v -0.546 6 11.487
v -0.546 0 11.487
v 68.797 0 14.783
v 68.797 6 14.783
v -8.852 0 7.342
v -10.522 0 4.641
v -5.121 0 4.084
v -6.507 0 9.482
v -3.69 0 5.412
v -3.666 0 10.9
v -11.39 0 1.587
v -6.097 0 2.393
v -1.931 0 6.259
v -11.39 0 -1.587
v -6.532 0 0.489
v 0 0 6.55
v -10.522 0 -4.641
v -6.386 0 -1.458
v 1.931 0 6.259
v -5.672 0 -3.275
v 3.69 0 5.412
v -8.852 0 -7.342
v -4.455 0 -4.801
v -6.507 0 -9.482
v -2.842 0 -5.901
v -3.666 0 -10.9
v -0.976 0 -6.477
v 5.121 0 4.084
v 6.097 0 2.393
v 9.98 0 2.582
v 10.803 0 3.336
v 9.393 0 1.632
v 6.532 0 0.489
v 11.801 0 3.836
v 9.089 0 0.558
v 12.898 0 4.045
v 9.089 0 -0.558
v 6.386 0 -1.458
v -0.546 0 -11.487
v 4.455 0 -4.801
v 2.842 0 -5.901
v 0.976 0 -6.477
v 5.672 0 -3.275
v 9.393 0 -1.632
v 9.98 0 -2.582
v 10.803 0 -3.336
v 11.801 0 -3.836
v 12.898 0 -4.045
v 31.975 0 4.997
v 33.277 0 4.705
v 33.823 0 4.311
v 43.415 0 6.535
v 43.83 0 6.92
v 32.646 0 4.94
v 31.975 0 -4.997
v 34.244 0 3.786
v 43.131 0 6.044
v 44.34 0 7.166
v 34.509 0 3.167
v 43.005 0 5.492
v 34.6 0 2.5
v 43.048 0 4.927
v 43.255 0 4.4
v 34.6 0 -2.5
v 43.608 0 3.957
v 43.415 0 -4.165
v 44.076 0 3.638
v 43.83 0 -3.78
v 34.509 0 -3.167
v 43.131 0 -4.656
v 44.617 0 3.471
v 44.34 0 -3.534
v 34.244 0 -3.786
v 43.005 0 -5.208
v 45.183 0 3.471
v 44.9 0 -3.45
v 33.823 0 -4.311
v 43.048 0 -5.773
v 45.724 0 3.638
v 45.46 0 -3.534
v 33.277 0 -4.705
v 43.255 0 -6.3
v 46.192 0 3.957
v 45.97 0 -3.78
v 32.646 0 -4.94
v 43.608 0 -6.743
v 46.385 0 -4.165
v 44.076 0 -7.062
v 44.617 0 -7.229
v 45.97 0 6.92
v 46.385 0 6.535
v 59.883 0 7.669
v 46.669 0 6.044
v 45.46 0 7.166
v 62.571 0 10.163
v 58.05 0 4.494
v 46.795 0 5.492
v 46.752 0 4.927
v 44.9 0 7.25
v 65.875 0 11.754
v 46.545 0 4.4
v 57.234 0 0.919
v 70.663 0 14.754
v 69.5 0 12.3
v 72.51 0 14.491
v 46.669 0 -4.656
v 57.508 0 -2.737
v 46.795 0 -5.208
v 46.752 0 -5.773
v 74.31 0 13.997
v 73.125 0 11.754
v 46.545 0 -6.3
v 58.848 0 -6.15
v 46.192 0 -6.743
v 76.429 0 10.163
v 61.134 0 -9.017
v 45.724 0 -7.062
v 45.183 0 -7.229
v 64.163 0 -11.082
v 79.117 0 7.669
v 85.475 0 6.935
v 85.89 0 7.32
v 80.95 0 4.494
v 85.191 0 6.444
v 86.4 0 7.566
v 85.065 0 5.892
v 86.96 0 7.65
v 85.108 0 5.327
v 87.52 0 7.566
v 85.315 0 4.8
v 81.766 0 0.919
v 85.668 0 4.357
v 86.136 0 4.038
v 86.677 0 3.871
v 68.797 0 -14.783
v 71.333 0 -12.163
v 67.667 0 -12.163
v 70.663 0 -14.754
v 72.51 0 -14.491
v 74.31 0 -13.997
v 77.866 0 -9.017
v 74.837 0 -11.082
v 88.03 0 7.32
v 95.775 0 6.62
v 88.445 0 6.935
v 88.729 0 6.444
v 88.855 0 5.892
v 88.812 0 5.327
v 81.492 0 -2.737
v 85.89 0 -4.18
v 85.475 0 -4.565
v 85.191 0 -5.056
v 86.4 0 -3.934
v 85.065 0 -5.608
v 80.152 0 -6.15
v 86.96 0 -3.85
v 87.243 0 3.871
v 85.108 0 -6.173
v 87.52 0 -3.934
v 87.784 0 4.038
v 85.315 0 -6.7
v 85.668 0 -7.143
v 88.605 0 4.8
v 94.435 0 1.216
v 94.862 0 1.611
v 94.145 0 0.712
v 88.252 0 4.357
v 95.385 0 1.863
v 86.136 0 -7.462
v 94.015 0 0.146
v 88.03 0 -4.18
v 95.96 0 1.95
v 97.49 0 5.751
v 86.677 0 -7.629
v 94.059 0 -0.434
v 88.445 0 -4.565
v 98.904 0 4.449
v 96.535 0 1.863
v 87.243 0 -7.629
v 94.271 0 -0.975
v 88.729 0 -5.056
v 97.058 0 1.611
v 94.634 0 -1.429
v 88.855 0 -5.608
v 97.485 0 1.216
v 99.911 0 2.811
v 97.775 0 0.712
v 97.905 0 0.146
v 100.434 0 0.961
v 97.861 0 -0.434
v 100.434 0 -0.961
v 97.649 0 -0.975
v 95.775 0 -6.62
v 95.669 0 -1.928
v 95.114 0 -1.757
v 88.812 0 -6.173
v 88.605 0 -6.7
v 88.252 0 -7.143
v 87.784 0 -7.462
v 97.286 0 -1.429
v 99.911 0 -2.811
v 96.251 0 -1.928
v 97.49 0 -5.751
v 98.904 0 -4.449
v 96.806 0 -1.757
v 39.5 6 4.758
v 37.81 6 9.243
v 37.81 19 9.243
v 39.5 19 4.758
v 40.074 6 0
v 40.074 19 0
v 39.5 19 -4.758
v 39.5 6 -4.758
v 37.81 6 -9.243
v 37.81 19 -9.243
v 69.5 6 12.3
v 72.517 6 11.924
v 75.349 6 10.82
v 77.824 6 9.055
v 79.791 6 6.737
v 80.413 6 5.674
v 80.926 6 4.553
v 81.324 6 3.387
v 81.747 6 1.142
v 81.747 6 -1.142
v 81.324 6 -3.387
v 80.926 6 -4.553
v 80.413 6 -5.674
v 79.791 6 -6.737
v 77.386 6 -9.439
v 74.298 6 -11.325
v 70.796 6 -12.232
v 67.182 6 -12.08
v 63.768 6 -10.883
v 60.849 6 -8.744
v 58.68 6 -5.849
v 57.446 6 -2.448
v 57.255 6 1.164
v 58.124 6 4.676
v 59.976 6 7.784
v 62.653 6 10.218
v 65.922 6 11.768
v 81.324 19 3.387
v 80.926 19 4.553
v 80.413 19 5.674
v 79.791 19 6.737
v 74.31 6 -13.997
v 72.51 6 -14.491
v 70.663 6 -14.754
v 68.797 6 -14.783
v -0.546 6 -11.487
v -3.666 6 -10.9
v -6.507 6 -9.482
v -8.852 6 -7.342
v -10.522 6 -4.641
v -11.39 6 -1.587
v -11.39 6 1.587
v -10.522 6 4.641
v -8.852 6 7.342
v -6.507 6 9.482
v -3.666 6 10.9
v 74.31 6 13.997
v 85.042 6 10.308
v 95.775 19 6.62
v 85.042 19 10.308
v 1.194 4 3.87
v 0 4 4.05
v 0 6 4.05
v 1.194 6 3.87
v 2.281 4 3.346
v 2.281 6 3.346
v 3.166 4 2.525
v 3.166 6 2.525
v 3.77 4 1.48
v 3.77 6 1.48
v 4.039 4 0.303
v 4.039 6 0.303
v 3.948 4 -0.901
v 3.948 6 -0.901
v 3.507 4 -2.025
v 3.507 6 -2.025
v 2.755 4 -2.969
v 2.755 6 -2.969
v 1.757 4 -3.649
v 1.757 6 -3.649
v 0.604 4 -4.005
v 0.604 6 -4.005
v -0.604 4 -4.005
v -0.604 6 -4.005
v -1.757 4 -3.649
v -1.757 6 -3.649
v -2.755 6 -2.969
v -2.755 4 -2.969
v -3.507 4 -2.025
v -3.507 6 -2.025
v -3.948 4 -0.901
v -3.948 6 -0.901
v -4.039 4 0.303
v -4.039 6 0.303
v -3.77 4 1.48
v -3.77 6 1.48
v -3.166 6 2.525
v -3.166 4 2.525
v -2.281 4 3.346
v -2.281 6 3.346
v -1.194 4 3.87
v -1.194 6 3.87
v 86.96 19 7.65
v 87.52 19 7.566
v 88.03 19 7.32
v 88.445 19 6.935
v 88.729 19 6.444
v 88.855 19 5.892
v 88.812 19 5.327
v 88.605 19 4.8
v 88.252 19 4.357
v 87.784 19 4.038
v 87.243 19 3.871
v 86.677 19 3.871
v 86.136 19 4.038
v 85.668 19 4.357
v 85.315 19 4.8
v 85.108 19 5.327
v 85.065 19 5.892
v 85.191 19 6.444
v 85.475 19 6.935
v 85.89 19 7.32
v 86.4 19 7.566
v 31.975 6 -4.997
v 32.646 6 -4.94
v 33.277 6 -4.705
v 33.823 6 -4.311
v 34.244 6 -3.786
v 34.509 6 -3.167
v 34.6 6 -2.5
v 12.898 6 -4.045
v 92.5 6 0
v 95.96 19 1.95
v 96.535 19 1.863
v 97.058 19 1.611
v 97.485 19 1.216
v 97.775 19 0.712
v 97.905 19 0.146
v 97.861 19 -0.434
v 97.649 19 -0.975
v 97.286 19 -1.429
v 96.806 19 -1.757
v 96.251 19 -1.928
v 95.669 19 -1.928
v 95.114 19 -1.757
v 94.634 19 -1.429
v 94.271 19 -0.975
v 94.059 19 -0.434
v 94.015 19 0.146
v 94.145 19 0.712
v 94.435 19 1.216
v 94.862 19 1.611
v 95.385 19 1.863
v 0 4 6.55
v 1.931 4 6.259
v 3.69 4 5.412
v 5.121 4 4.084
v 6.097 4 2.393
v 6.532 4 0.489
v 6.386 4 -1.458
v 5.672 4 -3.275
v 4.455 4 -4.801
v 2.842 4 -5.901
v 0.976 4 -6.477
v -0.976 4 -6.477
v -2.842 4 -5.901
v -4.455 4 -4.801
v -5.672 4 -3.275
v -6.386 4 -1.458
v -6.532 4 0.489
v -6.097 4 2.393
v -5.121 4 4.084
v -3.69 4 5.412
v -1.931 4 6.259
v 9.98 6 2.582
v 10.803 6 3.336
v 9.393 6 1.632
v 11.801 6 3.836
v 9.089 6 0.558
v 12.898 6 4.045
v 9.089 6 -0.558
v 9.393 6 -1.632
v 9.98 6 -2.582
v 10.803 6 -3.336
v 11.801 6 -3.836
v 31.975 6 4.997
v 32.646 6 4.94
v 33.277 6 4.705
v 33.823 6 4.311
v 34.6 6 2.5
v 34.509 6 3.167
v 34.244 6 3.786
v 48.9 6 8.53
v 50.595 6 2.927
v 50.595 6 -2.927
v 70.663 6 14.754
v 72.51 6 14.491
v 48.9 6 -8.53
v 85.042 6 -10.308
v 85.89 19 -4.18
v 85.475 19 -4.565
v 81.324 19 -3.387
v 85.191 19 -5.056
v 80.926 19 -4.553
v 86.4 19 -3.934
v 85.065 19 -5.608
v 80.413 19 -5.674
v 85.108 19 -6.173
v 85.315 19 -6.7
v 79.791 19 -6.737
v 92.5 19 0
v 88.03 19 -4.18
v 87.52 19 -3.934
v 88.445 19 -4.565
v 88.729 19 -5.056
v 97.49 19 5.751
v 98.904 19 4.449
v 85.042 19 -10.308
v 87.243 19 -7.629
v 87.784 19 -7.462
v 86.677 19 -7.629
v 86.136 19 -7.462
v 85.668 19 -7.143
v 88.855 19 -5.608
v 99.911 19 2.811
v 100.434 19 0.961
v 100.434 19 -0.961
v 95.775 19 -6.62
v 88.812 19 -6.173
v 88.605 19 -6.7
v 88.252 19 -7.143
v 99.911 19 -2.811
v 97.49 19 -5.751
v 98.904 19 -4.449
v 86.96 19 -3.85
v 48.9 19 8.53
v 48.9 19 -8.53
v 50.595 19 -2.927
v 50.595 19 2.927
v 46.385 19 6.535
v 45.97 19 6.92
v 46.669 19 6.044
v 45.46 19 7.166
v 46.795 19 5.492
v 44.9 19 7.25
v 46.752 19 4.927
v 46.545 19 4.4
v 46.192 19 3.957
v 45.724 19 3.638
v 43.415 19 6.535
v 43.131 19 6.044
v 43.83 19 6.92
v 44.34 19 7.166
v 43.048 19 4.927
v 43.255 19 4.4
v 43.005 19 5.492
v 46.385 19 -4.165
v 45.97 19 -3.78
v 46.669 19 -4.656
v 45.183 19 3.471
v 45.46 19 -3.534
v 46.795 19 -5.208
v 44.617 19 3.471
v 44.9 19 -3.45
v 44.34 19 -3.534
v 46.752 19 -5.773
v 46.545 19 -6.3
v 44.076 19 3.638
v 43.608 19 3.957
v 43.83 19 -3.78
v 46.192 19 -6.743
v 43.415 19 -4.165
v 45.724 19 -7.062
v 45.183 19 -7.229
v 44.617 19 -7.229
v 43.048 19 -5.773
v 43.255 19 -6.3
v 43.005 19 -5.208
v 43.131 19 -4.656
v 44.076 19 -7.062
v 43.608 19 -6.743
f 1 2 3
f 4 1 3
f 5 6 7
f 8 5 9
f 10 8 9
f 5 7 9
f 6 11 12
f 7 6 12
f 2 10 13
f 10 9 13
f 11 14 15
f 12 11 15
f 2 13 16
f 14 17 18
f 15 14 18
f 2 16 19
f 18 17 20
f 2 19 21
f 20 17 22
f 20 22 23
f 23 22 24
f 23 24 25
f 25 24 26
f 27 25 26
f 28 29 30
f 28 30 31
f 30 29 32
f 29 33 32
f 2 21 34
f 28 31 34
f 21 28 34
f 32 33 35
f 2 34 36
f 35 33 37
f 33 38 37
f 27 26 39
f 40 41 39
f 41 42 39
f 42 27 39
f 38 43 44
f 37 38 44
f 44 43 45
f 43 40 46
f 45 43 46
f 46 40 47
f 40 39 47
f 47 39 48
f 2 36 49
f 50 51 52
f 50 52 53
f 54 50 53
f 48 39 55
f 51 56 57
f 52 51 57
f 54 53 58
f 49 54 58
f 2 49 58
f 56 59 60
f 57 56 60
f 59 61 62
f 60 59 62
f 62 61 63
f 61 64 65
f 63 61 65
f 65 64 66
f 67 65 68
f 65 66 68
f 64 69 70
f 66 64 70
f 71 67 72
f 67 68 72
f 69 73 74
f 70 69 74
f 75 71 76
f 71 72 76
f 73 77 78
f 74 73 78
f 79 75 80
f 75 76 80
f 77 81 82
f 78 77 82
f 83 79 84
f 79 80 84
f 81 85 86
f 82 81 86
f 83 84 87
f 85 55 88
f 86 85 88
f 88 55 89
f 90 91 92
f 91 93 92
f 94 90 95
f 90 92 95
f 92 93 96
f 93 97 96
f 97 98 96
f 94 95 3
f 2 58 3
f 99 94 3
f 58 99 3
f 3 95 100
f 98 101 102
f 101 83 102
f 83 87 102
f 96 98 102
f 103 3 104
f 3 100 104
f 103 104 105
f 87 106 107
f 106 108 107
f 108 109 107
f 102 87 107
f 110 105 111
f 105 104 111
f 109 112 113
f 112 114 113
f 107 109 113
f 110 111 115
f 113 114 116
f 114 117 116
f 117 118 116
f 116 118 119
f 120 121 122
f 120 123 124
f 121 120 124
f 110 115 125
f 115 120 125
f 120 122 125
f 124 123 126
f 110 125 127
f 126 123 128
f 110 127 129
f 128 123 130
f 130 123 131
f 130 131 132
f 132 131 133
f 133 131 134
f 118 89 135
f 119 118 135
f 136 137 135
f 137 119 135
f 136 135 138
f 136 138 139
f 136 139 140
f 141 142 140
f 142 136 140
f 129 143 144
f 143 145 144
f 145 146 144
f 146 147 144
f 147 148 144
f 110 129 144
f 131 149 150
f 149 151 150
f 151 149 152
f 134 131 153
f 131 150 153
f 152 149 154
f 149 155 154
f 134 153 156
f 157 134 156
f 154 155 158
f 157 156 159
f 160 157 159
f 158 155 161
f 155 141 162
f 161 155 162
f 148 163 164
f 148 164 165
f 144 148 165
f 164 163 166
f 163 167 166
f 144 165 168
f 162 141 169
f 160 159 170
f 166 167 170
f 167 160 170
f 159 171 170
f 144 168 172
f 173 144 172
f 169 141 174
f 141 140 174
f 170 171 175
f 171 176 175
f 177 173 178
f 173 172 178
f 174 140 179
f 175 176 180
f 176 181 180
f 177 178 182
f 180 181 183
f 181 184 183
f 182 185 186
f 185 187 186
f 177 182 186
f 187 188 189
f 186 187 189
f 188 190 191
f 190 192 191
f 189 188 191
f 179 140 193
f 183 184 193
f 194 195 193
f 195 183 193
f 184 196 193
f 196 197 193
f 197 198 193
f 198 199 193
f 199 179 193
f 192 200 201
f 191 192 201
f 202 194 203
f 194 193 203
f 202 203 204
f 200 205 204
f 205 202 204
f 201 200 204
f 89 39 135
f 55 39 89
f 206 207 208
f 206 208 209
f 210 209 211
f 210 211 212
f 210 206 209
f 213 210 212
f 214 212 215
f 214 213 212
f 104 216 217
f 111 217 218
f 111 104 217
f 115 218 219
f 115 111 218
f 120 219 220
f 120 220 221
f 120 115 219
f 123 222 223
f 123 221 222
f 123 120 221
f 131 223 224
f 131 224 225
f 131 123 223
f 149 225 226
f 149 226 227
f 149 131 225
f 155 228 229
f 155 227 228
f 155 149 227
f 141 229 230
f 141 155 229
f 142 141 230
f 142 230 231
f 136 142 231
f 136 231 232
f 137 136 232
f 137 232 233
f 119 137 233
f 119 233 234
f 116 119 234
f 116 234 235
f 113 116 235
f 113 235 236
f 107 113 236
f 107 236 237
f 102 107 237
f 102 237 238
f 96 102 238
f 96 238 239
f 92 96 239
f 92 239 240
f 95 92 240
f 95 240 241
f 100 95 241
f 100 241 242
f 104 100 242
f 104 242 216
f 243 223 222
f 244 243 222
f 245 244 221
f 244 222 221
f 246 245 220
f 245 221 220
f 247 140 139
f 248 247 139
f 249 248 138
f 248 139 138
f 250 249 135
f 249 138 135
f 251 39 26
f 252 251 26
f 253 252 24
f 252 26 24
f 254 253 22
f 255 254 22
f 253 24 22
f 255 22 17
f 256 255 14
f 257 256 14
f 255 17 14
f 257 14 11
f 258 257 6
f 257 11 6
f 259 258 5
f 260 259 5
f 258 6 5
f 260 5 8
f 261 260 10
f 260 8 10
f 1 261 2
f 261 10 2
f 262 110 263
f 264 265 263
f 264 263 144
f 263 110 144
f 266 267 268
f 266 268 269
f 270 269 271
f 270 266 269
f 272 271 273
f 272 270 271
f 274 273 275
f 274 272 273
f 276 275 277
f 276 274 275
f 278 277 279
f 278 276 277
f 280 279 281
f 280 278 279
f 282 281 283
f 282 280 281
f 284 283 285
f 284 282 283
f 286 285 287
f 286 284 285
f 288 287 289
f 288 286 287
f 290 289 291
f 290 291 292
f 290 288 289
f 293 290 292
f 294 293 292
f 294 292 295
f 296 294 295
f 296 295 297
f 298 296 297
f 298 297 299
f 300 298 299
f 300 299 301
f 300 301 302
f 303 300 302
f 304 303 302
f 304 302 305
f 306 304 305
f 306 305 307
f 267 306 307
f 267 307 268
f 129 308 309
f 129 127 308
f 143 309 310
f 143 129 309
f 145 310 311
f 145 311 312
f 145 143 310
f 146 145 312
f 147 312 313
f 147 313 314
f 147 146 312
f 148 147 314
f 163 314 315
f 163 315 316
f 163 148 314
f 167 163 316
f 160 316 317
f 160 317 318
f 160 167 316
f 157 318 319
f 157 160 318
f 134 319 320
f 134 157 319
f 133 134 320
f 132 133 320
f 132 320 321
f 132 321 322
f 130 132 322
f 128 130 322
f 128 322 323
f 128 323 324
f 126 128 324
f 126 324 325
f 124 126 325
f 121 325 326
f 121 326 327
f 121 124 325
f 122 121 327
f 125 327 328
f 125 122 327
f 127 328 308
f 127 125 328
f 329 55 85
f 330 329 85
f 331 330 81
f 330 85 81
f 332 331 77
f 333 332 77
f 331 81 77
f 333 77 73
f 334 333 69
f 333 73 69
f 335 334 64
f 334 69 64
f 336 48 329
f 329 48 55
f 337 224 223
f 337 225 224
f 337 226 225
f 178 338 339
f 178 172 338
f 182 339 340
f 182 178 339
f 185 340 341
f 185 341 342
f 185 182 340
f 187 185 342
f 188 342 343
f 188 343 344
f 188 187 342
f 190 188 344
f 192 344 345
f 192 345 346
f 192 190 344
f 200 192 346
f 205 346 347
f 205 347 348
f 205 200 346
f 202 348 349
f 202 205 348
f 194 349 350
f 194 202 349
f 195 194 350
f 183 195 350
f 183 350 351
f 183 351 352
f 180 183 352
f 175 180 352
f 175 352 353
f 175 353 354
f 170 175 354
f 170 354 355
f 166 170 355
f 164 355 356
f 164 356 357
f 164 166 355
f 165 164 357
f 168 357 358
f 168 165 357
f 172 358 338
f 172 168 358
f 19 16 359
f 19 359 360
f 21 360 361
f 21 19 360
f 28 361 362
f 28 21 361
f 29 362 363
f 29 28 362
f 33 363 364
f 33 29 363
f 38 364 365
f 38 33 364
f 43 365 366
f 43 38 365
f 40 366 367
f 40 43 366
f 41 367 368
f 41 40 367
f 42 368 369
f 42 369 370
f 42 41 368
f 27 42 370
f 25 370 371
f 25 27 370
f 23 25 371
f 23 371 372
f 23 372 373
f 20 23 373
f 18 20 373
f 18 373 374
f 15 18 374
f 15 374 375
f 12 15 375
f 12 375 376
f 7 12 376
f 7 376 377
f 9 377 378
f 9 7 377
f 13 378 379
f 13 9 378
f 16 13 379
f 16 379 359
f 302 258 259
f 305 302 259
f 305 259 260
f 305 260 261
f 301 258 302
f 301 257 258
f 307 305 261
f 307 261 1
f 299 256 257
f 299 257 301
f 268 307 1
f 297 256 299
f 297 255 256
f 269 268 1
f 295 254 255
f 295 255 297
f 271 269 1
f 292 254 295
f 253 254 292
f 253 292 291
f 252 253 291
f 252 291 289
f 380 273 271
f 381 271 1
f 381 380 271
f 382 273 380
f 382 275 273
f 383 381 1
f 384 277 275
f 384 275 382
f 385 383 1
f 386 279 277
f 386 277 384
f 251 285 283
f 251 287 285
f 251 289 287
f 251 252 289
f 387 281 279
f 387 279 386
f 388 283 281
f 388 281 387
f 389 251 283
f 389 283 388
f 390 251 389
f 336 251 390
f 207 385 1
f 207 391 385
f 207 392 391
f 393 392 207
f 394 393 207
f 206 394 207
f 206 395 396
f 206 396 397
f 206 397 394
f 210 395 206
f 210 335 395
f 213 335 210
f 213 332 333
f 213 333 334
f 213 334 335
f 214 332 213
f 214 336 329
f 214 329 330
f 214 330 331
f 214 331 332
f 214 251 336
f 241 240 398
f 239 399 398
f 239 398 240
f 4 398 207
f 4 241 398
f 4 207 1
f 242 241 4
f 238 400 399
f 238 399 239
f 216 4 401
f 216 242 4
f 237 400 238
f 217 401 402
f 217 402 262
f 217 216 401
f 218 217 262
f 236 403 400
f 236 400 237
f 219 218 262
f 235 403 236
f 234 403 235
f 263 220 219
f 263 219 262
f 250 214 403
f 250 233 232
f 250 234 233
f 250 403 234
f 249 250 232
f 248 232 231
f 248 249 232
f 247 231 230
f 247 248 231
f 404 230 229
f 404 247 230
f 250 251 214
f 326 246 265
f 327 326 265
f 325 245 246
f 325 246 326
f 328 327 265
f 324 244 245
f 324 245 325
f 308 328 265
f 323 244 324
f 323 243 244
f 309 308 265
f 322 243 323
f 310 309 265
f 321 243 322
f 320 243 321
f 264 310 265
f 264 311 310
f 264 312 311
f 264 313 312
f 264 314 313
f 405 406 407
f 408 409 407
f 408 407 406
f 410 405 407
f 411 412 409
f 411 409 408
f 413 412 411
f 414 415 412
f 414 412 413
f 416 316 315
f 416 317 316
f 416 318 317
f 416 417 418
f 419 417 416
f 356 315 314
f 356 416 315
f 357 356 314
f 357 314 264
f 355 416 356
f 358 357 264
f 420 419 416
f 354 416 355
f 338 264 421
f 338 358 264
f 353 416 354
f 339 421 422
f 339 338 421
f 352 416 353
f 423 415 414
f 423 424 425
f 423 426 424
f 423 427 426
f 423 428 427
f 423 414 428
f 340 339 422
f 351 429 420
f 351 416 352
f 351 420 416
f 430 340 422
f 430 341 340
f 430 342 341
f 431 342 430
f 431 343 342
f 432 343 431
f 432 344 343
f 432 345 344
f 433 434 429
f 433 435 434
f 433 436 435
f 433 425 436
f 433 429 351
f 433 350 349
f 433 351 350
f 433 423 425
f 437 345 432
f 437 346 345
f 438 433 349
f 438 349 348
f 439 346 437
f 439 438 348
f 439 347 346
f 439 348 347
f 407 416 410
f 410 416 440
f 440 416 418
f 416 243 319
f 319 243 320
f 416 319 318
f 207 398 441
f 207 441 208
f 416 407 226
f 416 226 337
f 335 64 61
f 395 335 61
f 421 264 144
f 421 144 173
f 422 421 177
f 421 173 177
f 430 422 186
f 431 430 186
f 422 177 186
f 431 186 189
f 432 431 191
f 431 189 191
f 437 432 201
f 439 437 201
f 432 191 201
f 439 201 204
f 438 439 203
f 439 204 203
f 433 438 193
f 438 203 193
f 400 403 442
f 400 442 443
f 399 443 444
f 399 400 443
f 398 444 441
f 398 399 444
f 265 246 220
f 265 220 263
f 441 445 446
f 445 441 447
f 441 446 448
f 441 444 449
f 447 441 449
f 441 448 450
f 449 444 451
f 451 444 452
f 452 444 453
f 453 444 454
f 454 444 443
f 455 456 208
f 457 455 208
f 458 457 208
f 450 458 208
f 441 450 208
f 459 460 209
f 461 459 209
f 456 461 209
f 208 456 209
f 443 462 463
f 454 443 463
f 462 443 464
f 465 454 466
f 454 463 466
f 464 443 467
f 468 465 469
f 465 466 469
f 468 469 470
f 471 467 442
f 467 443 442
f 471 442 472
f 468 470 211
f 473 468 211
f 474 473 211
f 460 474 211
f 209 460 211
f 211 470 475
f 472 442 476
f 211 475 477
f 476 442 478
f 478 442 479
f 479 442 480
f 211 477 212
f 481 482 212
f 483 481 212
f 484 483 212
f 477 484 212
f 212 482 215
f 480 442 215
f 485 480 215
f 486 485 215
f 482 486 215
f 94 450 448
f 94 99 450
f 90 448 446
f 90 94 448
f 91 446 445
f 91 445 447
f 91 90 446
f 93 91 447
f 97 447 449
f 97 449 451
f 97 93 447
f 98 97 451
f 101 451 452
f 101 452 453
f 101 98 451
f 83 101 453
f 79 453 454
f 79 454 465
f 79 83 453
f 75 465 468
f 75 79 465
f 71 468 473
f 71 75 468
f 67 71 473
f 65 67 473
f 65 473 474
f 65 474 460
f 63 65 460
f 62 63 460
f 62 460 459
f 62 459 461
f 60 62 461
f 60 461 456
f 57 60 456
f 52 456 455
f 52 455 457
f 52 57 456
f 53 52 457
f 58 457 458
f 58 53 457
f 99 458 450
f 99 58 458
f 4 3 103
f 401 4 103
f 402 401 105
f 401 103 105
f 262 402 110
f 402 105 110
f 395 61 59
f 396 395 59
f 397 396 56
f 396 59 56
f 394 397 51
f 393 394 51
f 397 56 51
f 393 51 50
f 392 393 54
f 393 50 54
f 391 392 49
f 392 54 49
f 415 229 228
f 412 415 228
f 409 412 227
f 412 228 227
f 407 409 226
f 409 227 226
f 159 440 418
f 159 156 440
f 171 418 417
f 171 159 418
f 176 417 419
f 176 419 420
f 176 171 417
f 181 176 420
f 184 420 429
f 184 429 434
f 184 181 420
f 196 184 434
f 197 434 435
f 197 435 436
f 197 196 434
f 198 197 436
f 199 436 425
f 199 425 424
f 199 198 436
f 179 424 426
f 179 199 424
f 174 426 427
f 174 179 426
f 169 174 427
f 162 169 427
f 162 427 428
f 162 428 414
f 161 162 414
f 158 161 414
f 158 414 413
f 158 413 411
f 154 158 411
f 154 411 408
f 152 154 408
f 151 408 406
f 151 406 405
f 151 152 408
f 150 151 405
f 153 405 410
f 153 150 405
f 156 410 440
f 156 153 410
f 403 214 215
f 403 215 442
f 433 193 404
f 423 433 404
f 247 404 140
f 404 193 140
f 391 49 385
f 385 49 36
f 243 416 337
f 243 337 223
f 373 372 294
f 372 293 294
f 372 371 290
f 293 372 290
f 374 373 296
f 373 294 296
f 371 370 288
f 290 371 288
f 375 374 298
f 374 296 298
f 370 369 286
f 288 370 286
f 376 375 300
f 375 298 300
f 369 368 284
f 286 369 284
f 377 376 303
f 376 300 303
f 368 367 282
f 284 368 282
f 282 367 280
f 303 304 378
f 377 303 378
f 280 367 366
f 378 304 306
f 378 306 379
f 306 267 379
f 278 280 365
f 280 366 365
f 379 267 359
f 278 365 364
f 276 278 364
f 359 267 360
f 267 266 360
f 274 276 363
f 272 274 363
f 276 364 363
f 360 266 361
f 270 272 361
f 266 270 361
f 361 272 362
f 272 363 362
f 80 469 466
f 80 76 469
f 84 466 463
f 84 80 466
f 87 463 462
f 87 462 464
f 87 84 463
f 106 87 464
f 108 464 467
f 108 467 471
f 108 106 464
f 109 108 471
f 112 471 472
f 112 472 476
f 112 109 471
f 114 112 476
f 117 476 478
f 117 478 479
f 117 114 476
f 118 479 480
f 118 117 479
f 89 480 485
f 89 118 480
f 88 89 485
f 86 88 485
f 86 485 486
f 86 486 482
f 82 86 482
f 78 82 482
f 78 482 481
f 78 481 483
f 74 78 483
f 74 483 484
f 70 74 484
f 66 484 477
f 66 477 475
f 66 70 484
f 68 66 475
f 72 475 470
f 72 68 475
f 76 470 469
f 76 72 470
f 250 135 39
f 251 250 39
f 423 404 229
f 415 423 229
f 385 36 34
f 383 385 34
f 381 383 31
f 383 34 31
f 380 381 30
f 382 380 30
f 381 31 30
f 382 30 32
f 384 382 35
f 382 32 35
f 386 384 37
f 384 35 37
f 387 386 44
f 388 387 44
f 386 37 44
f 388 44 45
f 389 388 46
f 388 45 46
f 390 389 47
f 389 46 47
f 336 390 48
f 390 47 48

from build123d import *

# Parameters (mm, degrees)
SKETCH1_R           = 1.9
SKETCH1_R_2         = 4.05
SKETCH1_R_3         = 12.3
SKETCH1_R_4         = 1.95
BOSS_EXTRUDE1_DEPTH = 6
SKETCH2_R           = 6.55
CUT_EXTRUDE1_DEPTH  = 4
SKETCH3_R           = 1.9
BOSS_EXTRUDE3_DEPTH = 13
SKETCH4_R           = 1.9
SKETCH4_R_2         = 1.95
BOSS_EXTRUDE4_DEPTH = 13


with BuildPart() as part:
    # Sketch1 → Boss-Extrude1 (new body)
    with BuildSketch(Plane(origin=(0, 0, 0), x_dir=(1, 0, 0), z_dir=(0, 1, 0))):
        with BuildLine():
            Line((68.797266187, 14.783306977), (-0.546043165, 11.48702907))
            ThreePointArc((-0.546043165, 11.48702907), (-11.5, 0), (-0.546043165, -11.48702907))
            Line((-0.546043165, -11.48702907), (68.797266187, -14.783306977))
            ThreePointArc((68.797266187, -14.783306977), (71.590968354, -14.651547746), (74.31, -13.996567436))
            Line((74.31, -13.996567436), (95.775, -6.619998112))
            ThreePointArc((95.775, -6.619998112), (100.5, 0), (95.775, 6.619998112))
            Line((95.775, 6.619998112), (74.31, 13.996567436))
            ThreePointArc((74.31, 13.996567436), (71.590968354, 14.651547746), (68.797266187, 14.783306977))
        make_face()
        with Locations(Location((44.9, -5.35, 0), (0, 0, 270))):
            Circle(SKETCH1_R, mode=Mode.SUBTRACT)
        with Locations(Location((0, 0, 0), (0, 0, 270))):
            Circle(SKETCH1_R_2, mode=Mode.SUBTRACT)
        with BuildLine():
            ThreePointArc((12.898162181, -4.044967428), (9.05, 0), (12.898162181, 4.044967428))
            Line((12.898162181, 4.044967428), (31.975408753, 4.996893474))
            ThreePointArc((31.975408753, 4.996893474), (33.823154358, 4.311281054), (34.6, 2.5))
            Line((34.6, 2.5), (34.6, -2.5))
            ThreePointArc((34.6, -2.5), (33.823154358, -4.311281054), (31.975408753, -4.996893474))
            Line((31.975408753, -4.996893474), (12.898162181, -4.044967428))
        make_face(mode=Mode.SUBTRACT)
        with Locations(Location((44.9, 5.35, 0), (0, 0, 270))):
            Circle(SKETCH1_R, mode=Mode.SUBTRACT)
        with Locations(Location((69.5, 0, 0), (0, 0, 270))):
            Circle(SKETCH1_R_3, mode=Mode.SUBTRACT)
        with Locations(Location((86.96, 5.75, 0), (0, 0, 270))):
            Circle(SKETCH1_R, mode=Mode.SUBTRACT)
        with Locations(Location((95.96, 0, 0), (0, 0, 270))):
            Circle(SKETCH1_R_4, mode=Mode.SUBTRACT)
        with Locations(Location((86.96, -5.75, 0), (0, 0, 270))):
            Circle(SKETCH1_R, mode=Mode.SUBTRACT)
    extrude(amount=BOSS_EXTRUDE1_DEPTH)

    # Sketch2 → Cut-Extrude1 (cut)
    with BuildSketch(Plane(origin=(0, 0, 0), x_dir=(1, 0, 0), z_dir=(0, 1, 0))):
        with Locations(Location((0, 0, 0), (0, 0, 270))):
            Circle(SKETCH2_R)
    extrude(amount=CUT_EXTRUDE1_DEPTH, mode=Mode.SUBTRACT)

    # Sketch3 → Boss-Extrude3 (add)
    with BuildSketch(Plane(origin=(0, 6, 0), x_dir=(1, 0, 0), z_dir=(0, 1, 0))):
        with BuildLine():
            Line((37.810248758, 9.243466249), (48.9, 8.53))
            ThreePointArc((48.9, 8.53), (50.810248758, 0), (48.9, -8.53))
            Line((48.9, -8.53), (37.810248758, -9.243466249))
            ThreePointArc((37.810248758, -9.243466249), (40.074456368, 0), (37.810248758, 9.243466249))
        make_face()
        with Locations(Location((44.9, -5.35, 0), (0, 0, 270))):
            Circle(SKETCH3_R, mode=Mode.SUBTRACT)
        with Locations(Location((44.9, 5.35, 0), (0, 0, 270))):
            Circle(SKETCH3_R, mode=Mode.SUBTRACT)
    extrude(amount=BOSS_EXTRUDE3_DEPTH)

    # Sketch4 → Boss-Extrude4 (add)
    with BuildSketch(Plane(origin=(0, 6, 0), x_dir=(1, 0, 0), z_dir=(0, 1, 0))):
        with BuildLine():
            Line((85.0425, 10.308282774), (79.790912588, 6.736996223))
            ThreePointArc((79.790912588, 6.736996223), (80.683848774, 5.119719388), (81.32449086, 3.386947876))
            Line((81.32449086, 3.386947876), (92.5, 0))
            Line((92.5, 0), (81.32449086, -3.386947876))
            ThreePointArc((81.32449086, -3.386947876), (80.683848774, -5.119719388), (79.790912588, -6.736996223))
            Line((79.790912588, -6.736996223), (85.0425, -10.308282774))
            Line((85.0425, -10.308282774), (95.775, -6.619998112))
            ThreePointArc((95.775, -6.619998112), (100.5, 0), (95.775, 6.619998112))
            Line((95.775, 6.619998112), (85.0425, 10.308282774))
        make_face()
        with Locations(Location((86.96, 5.75, 0), (0, 0, 270))):
            Circle(SKETCH4_R, mode=Mode.SUBTRACT)
        with Locations(Location((86.96, -5.75, 0), (0, 0, 270))):
            Circle(SKETCH4_R, mode=Mode.SUBTRACT)
        with Locations(Location((95.96, 0, 0), (0, 0, 270))):
            Circle(SKETCH4_R_2, mode=Mode.SUBTRACT)
    extrude(amount=BOSS_EXTRUDE4_DEPTH)


solid = part.part
